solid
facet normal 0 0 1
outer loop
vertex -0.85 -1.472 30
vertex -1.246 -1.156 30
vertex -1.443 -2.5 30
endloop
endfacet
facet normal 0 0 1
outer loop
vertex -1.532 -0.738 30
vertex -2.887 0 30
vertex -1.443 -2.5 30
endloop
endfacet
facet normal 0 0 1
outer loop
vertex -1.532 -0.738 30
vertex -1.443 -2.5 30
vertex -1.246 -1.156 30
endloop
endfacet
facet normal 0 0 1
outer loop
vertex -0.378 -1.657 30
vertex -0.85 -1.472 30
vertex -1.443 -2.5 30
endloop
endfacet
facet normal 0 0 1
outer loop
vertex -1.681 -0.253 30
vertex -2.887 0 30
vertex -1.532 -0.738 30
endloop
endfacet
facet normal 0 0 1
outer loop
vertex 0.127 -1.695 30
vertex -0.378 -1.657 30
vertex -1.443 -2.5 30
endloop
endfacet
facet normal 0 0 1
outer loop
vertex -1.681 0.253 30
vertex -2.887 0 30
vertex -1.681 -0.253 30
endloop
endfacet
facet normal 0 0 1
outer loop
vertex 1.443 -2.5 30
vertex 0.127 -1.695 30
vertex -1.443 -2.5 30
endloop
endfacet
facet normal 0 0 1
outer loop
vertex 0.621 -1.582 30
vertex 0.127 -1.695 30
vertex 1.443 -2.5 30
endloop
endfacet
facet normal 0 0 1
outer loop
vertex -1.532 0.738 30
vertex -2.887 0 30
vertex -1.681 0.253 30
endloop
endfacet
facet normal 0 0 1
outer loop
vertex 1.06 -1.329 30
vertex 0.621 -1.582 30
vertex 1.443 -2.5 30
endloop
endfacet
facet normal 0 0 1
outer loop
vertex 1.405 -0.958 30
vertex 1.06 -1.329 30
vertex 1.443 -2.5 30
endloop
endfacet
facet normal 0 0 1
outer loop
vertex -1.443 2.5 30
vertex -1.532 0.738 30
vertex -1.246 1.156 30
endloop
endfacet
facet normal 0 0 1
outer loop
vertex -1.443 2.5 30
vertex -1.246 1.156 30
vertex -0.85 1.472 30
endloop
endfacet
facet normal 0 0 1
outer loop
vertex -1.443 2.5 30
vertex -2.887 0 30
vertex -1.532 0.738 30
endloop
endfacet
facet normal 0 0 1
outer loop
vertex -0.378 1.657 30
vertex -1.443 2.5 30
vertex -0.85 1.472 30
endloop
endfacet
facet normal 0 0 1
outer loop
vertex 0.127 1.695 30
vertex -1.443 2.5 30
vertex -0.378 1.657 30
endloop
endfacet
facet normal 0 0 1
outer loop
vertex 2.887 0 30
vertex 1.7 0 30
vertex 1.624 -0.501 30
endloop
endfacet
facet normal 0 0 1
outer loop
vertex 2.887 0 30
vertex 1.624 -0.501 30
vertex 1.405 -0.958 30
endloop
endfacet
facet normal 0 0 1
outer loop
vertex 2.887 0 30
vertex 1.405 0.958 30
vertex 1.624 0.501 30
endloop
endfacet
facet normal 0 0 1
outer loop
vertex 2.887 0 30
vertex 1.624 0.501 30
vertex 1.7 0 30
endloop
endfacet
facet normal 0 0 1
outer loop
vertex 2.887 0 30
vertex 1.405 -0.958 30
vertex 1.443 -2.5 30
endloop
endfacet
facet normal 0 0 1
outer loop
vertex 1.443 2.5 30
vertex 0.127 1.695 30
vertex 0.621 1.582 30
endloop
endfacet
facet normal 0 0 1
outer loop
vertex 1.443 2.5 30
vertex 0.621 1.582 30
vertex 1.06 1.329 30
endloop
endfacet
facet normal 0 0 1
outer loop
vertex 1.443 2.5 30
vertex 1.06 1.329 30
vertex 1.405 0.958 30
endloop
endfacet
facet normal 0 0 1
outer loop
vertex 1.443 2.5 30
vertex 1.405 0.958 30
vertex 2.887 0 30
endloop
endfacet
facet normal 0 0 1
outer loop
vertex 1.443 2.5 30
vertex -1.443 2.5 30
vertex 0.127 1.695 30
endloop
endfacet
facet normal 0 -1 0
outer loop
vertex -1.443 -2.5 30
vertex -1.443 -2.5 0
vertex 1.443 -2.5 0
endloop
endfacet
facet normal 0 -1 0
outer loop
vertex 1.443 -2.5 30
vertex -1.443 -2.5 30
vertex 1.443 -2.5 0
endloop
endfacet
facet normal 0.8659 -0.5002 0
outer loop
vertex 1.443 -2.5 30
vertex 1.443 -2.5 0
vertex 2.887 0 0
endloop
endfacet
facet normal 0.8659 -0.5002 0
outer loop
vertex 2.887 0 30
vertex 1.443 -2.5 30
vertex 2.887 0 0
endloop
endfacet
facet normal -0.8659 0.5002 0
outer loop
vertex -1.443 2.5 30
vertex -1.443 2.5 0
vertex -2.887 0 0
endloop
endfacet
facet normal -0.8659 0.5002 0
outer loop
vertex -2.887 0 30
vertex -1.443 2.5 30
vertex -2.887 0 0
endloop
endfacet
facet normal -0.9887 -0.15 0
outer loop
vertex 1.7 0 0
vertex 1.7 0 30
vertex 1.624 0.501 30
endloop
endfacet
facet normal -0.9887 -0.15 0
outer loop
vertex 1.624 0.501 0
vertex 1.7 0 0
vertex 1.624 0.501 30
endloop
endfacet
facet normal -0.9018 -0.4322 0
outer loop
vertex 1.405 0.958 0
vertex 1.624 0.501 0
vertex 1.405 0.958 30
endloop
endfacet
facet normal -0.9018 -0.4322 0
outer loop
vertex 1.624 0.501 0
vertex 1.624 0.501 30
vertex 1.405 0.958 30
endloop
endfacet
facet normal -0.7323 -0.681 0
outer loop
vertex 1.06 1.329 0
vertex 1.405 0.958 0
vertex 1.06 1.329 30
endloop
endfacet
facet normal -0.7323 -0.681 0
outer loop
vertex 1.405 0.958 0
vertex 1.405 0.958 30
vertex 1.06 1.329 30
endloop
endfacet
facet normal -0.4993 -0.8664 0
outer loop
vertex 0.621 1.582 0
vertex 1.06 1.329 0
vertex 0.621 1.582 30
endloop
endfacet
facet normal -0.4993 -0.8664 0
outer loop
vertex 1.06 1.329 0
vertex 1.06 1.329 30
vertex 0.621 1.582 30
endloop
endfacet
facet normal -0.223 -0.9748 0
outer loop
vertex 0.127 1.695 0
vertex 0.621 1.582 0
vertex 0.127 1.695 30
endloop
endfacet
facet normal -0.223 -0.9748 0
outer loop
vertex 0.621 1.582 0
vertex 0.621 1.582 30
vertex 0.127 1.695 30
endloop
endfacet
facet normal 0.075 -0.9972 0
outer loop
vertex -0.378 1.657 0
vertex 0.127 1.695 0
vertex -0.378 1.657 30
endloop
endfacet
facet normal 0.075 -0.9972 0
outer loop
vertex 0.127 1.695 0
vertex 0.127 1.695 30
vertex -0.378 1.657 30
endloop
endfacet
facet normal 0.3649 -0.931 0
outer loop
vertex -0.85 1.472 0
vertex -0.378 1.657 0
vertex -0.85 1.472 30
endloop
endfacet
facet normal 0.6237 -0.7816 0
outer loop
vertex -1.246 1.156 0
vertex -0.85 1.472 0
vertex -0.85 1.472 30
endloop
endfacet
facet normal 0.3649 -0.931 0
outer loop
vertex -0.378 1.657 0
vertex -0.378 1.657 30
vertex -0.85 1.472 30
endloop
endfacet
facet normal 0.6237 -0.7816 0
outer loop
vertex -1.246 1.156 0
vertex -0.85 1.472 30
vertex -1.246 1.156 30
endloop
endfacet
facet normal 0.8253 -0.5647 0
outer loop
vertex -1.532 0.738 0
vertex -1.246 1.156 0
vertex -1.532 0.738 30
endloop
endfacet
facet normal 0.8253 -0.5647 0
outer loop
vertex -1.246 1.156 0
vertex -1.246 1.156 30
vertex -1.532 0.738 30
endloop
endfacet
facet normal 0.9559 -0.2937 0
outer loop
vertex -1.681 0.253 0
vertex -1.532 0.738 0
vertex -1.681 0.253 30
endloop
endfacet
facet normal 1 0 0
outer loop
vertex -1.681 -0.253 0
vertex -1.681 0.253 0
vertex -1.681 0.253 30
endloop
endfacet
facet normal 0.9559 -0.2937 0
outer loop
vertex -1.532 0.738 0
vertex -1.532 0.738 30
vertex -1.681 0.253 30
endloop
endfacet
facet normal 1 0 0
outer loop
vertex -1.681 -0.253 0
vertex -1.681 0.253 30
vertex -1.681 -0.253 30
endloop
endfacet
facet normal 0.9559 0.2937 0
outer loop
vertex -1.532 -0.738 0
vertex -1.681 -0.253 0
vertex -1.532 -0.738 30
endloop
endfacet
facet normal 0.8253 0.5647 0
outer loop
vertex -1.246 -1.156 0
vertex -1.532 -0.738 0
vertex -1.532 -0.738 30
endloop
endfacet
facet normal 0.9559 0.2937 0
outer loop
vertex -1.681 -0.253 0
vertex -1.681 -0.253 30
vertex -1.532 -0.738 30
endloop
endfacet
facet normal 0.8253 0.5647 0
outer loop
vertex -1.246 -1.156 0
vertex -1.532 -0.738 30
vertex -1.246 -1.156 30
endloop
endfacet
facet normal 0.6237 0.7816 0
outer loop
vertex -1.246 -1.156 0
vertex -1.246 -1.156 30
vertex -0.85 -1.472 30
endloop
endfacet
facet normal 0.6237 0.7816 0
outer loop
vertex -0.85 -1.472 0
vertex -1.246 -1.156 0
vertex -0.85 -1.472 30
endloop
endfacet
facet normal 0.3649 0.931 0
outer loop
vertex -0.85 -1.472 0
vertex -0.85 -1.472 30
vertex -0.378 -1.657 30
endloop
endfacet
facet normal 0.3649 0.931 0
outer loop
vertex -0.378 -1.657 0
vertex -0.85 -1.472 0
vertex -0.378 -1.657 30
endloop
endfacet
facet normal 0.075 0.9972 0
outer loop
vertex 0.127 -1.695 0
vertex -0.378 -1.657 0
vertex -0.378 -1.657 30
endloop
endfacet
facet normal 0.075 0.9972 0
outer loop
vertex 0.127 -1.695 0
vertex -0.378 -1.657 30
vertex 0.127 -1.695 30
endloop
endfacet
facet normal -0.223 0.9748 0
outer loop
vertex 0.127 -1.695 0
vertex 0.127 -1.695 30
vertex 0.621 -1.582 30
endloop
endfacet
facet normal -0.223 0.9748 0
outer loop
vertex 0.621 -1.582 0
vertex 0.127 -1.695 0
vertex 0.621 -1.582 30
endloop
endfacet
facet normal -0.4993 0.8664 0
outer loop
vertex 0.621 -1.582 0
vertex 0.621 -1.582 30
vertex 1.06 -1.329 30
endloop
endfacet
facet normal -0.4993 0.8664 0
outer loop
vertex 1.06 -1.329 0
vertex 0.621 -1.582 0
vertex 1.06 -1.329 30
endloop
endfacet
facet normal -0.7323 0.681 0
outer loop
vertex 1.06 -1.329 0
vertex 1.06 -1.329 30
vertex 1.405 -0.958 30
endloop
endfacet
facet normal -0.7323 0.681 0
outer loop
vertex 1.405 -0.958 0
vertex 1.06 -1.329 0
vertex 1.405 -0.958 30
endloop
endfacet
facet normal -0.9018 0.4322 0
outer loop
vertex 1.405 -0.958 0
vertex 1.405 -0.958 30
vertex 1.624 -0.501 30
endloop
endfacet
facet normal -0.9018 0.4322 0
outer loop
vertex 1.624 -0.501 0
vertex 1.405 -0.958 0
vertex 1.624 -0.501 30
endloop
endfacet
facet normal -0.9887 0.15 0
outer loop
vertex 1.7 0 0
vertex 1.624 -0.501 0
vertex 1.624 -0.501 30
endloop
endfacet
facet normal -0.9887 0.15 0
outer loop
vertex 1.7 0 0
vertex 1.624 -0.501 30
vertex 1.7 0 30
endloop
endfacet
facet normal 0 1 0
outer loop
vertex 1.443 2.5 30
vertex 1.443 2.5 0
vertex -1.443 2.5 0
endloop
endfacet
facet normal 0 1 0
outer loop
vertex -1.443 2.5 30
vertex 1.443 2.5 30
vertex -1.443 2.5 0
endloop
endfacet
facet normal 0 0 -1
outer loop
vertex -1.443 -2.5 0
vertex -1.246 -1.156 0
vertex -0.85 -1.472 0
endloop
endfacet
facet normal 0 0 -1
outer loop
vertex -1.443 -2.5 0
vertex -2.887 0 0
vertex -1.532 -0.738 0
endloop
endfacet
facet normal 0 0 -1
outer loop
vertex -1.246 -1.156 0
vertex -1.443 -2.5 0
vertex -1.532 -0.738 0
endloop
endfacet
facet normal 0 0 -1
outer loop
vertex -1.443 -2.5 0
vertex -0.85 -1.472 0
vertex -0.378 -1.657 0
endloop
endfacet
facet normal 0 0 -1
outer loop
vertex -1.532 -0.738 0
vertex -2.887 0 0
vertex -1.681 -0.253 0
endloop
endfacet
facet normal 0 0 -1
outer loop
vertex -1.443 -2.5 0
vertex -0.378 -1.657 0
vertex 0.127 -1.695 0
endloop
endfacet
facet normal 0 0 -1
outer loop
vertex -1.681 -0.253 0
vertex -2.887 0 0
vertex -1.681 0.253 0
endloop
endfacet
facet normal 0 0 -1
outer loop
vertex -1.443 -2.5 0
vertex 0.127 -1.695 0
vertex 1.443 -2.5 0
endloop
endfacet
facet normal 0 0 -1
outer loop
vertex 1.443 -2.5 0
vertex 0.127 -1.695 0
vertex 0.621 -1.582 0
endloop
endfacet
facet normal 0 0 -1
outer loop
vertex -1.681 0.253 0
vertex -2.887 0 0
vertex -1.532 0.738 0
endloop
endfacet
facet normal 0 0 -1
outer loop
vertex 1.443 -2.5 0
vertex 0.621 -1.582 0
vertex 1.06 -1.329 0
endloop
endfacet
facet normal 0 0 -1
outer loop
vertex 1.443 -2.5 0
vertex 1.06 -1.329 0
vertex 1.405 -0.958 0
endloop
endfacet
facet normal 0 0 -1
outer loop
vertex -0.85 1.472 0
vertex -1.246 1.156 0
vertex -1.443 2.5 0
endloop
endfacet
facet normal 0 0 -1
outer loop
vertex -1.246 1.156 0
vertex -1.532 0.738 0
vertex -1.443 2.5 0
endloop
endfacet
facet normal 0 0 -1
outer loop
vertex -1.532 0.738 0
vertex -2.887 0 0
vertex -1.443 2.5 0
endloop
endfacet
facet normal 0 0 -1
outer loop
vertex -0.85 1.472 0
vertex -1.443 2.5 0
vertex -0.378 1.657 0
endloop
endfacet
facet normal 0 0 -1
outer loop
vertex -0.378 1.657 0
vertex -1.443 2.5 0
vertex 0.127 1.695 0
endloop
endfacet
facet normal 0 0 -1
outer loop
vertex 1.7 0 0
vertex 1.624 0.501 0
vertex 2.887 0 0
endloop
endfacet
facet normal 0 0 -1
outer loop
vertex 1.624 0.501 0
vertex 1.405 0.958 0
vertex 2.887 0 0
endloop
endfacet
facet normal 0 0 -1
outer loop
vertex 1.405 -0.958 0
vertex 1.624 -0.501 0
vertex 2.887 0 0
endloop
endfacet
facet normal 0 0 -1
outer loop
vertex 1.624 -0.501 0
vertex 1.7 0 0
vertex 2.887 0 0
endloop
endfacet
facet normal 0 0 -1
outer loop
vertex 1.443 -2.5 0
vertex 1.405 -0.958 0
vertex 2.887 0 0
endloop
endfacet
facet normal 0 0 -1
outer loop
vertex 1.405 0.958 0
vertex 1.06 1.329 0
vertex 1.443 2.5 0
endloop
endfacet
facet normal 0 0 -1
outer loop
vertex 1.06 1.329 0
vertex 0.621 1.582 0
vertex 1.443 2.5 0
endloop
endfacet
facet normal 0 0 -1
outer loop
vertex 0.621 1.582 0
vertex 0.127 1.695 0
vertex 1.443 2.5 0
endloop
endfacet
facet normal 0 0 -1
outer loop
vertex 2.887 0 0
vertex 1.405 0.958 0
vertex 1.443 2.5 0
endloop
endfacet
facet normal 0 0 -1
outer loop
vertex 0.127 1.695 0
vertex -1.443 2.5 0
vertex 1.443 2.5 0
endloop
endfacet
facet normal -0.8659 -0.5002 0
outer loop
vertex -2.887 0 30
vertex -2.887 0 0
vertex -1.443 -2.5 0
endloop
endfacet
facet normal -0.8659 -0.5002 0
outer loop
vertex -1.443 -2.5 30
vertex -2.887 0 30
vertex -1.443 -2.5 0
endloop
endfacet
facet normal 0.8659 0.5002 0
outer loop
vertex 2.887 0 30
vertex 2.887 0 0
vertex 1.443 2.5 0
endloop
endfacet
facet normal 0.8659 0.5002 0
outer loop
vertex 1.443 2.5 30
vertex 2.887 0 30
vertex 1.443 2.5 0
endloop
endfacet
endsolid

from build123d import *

# Parameters (mm, degrees)
EXTRUDE_1_DEPTH              = 30
HOLE_WIZARD_M3_2_D           = 3.4
HOLE_WIZARD_M3_2_ON_FACE_2_D = 3.4


with BuildPart() as part:
    # 스케치1 → 보스-돌출1 (new body)
    with BuildSketch(Plane.XY):
        Polygon((1.443375673, -2.5), (2.886751346, 0), (1.443375673, 2.5), (-1.443375673, 2.5), (-2.886751346, 0), (-1.443375673, -2.5), align=None)
    extrude(amount=EXTRUDE_1_DEPTH)

    # M3 여유 구멍2 (through all)
    with Locations(Plane(origin=(0, 0, 0), x_dir=(-1, 0, 0), z_dir=(0, 0, -1))):
        with Locations((0, 0)):
            Hole(HOLE_WIZARD_M3_2_D / 2)

    # M3 여유 구멍2 on face 2 (through all)
    with Locations(Plane.XY.offset(30)):
        with Locations((0, 0)):
            Hole(HOLE_WIZARD_M3_2_ON_FACE_2_D / 2)


solid = part.part
